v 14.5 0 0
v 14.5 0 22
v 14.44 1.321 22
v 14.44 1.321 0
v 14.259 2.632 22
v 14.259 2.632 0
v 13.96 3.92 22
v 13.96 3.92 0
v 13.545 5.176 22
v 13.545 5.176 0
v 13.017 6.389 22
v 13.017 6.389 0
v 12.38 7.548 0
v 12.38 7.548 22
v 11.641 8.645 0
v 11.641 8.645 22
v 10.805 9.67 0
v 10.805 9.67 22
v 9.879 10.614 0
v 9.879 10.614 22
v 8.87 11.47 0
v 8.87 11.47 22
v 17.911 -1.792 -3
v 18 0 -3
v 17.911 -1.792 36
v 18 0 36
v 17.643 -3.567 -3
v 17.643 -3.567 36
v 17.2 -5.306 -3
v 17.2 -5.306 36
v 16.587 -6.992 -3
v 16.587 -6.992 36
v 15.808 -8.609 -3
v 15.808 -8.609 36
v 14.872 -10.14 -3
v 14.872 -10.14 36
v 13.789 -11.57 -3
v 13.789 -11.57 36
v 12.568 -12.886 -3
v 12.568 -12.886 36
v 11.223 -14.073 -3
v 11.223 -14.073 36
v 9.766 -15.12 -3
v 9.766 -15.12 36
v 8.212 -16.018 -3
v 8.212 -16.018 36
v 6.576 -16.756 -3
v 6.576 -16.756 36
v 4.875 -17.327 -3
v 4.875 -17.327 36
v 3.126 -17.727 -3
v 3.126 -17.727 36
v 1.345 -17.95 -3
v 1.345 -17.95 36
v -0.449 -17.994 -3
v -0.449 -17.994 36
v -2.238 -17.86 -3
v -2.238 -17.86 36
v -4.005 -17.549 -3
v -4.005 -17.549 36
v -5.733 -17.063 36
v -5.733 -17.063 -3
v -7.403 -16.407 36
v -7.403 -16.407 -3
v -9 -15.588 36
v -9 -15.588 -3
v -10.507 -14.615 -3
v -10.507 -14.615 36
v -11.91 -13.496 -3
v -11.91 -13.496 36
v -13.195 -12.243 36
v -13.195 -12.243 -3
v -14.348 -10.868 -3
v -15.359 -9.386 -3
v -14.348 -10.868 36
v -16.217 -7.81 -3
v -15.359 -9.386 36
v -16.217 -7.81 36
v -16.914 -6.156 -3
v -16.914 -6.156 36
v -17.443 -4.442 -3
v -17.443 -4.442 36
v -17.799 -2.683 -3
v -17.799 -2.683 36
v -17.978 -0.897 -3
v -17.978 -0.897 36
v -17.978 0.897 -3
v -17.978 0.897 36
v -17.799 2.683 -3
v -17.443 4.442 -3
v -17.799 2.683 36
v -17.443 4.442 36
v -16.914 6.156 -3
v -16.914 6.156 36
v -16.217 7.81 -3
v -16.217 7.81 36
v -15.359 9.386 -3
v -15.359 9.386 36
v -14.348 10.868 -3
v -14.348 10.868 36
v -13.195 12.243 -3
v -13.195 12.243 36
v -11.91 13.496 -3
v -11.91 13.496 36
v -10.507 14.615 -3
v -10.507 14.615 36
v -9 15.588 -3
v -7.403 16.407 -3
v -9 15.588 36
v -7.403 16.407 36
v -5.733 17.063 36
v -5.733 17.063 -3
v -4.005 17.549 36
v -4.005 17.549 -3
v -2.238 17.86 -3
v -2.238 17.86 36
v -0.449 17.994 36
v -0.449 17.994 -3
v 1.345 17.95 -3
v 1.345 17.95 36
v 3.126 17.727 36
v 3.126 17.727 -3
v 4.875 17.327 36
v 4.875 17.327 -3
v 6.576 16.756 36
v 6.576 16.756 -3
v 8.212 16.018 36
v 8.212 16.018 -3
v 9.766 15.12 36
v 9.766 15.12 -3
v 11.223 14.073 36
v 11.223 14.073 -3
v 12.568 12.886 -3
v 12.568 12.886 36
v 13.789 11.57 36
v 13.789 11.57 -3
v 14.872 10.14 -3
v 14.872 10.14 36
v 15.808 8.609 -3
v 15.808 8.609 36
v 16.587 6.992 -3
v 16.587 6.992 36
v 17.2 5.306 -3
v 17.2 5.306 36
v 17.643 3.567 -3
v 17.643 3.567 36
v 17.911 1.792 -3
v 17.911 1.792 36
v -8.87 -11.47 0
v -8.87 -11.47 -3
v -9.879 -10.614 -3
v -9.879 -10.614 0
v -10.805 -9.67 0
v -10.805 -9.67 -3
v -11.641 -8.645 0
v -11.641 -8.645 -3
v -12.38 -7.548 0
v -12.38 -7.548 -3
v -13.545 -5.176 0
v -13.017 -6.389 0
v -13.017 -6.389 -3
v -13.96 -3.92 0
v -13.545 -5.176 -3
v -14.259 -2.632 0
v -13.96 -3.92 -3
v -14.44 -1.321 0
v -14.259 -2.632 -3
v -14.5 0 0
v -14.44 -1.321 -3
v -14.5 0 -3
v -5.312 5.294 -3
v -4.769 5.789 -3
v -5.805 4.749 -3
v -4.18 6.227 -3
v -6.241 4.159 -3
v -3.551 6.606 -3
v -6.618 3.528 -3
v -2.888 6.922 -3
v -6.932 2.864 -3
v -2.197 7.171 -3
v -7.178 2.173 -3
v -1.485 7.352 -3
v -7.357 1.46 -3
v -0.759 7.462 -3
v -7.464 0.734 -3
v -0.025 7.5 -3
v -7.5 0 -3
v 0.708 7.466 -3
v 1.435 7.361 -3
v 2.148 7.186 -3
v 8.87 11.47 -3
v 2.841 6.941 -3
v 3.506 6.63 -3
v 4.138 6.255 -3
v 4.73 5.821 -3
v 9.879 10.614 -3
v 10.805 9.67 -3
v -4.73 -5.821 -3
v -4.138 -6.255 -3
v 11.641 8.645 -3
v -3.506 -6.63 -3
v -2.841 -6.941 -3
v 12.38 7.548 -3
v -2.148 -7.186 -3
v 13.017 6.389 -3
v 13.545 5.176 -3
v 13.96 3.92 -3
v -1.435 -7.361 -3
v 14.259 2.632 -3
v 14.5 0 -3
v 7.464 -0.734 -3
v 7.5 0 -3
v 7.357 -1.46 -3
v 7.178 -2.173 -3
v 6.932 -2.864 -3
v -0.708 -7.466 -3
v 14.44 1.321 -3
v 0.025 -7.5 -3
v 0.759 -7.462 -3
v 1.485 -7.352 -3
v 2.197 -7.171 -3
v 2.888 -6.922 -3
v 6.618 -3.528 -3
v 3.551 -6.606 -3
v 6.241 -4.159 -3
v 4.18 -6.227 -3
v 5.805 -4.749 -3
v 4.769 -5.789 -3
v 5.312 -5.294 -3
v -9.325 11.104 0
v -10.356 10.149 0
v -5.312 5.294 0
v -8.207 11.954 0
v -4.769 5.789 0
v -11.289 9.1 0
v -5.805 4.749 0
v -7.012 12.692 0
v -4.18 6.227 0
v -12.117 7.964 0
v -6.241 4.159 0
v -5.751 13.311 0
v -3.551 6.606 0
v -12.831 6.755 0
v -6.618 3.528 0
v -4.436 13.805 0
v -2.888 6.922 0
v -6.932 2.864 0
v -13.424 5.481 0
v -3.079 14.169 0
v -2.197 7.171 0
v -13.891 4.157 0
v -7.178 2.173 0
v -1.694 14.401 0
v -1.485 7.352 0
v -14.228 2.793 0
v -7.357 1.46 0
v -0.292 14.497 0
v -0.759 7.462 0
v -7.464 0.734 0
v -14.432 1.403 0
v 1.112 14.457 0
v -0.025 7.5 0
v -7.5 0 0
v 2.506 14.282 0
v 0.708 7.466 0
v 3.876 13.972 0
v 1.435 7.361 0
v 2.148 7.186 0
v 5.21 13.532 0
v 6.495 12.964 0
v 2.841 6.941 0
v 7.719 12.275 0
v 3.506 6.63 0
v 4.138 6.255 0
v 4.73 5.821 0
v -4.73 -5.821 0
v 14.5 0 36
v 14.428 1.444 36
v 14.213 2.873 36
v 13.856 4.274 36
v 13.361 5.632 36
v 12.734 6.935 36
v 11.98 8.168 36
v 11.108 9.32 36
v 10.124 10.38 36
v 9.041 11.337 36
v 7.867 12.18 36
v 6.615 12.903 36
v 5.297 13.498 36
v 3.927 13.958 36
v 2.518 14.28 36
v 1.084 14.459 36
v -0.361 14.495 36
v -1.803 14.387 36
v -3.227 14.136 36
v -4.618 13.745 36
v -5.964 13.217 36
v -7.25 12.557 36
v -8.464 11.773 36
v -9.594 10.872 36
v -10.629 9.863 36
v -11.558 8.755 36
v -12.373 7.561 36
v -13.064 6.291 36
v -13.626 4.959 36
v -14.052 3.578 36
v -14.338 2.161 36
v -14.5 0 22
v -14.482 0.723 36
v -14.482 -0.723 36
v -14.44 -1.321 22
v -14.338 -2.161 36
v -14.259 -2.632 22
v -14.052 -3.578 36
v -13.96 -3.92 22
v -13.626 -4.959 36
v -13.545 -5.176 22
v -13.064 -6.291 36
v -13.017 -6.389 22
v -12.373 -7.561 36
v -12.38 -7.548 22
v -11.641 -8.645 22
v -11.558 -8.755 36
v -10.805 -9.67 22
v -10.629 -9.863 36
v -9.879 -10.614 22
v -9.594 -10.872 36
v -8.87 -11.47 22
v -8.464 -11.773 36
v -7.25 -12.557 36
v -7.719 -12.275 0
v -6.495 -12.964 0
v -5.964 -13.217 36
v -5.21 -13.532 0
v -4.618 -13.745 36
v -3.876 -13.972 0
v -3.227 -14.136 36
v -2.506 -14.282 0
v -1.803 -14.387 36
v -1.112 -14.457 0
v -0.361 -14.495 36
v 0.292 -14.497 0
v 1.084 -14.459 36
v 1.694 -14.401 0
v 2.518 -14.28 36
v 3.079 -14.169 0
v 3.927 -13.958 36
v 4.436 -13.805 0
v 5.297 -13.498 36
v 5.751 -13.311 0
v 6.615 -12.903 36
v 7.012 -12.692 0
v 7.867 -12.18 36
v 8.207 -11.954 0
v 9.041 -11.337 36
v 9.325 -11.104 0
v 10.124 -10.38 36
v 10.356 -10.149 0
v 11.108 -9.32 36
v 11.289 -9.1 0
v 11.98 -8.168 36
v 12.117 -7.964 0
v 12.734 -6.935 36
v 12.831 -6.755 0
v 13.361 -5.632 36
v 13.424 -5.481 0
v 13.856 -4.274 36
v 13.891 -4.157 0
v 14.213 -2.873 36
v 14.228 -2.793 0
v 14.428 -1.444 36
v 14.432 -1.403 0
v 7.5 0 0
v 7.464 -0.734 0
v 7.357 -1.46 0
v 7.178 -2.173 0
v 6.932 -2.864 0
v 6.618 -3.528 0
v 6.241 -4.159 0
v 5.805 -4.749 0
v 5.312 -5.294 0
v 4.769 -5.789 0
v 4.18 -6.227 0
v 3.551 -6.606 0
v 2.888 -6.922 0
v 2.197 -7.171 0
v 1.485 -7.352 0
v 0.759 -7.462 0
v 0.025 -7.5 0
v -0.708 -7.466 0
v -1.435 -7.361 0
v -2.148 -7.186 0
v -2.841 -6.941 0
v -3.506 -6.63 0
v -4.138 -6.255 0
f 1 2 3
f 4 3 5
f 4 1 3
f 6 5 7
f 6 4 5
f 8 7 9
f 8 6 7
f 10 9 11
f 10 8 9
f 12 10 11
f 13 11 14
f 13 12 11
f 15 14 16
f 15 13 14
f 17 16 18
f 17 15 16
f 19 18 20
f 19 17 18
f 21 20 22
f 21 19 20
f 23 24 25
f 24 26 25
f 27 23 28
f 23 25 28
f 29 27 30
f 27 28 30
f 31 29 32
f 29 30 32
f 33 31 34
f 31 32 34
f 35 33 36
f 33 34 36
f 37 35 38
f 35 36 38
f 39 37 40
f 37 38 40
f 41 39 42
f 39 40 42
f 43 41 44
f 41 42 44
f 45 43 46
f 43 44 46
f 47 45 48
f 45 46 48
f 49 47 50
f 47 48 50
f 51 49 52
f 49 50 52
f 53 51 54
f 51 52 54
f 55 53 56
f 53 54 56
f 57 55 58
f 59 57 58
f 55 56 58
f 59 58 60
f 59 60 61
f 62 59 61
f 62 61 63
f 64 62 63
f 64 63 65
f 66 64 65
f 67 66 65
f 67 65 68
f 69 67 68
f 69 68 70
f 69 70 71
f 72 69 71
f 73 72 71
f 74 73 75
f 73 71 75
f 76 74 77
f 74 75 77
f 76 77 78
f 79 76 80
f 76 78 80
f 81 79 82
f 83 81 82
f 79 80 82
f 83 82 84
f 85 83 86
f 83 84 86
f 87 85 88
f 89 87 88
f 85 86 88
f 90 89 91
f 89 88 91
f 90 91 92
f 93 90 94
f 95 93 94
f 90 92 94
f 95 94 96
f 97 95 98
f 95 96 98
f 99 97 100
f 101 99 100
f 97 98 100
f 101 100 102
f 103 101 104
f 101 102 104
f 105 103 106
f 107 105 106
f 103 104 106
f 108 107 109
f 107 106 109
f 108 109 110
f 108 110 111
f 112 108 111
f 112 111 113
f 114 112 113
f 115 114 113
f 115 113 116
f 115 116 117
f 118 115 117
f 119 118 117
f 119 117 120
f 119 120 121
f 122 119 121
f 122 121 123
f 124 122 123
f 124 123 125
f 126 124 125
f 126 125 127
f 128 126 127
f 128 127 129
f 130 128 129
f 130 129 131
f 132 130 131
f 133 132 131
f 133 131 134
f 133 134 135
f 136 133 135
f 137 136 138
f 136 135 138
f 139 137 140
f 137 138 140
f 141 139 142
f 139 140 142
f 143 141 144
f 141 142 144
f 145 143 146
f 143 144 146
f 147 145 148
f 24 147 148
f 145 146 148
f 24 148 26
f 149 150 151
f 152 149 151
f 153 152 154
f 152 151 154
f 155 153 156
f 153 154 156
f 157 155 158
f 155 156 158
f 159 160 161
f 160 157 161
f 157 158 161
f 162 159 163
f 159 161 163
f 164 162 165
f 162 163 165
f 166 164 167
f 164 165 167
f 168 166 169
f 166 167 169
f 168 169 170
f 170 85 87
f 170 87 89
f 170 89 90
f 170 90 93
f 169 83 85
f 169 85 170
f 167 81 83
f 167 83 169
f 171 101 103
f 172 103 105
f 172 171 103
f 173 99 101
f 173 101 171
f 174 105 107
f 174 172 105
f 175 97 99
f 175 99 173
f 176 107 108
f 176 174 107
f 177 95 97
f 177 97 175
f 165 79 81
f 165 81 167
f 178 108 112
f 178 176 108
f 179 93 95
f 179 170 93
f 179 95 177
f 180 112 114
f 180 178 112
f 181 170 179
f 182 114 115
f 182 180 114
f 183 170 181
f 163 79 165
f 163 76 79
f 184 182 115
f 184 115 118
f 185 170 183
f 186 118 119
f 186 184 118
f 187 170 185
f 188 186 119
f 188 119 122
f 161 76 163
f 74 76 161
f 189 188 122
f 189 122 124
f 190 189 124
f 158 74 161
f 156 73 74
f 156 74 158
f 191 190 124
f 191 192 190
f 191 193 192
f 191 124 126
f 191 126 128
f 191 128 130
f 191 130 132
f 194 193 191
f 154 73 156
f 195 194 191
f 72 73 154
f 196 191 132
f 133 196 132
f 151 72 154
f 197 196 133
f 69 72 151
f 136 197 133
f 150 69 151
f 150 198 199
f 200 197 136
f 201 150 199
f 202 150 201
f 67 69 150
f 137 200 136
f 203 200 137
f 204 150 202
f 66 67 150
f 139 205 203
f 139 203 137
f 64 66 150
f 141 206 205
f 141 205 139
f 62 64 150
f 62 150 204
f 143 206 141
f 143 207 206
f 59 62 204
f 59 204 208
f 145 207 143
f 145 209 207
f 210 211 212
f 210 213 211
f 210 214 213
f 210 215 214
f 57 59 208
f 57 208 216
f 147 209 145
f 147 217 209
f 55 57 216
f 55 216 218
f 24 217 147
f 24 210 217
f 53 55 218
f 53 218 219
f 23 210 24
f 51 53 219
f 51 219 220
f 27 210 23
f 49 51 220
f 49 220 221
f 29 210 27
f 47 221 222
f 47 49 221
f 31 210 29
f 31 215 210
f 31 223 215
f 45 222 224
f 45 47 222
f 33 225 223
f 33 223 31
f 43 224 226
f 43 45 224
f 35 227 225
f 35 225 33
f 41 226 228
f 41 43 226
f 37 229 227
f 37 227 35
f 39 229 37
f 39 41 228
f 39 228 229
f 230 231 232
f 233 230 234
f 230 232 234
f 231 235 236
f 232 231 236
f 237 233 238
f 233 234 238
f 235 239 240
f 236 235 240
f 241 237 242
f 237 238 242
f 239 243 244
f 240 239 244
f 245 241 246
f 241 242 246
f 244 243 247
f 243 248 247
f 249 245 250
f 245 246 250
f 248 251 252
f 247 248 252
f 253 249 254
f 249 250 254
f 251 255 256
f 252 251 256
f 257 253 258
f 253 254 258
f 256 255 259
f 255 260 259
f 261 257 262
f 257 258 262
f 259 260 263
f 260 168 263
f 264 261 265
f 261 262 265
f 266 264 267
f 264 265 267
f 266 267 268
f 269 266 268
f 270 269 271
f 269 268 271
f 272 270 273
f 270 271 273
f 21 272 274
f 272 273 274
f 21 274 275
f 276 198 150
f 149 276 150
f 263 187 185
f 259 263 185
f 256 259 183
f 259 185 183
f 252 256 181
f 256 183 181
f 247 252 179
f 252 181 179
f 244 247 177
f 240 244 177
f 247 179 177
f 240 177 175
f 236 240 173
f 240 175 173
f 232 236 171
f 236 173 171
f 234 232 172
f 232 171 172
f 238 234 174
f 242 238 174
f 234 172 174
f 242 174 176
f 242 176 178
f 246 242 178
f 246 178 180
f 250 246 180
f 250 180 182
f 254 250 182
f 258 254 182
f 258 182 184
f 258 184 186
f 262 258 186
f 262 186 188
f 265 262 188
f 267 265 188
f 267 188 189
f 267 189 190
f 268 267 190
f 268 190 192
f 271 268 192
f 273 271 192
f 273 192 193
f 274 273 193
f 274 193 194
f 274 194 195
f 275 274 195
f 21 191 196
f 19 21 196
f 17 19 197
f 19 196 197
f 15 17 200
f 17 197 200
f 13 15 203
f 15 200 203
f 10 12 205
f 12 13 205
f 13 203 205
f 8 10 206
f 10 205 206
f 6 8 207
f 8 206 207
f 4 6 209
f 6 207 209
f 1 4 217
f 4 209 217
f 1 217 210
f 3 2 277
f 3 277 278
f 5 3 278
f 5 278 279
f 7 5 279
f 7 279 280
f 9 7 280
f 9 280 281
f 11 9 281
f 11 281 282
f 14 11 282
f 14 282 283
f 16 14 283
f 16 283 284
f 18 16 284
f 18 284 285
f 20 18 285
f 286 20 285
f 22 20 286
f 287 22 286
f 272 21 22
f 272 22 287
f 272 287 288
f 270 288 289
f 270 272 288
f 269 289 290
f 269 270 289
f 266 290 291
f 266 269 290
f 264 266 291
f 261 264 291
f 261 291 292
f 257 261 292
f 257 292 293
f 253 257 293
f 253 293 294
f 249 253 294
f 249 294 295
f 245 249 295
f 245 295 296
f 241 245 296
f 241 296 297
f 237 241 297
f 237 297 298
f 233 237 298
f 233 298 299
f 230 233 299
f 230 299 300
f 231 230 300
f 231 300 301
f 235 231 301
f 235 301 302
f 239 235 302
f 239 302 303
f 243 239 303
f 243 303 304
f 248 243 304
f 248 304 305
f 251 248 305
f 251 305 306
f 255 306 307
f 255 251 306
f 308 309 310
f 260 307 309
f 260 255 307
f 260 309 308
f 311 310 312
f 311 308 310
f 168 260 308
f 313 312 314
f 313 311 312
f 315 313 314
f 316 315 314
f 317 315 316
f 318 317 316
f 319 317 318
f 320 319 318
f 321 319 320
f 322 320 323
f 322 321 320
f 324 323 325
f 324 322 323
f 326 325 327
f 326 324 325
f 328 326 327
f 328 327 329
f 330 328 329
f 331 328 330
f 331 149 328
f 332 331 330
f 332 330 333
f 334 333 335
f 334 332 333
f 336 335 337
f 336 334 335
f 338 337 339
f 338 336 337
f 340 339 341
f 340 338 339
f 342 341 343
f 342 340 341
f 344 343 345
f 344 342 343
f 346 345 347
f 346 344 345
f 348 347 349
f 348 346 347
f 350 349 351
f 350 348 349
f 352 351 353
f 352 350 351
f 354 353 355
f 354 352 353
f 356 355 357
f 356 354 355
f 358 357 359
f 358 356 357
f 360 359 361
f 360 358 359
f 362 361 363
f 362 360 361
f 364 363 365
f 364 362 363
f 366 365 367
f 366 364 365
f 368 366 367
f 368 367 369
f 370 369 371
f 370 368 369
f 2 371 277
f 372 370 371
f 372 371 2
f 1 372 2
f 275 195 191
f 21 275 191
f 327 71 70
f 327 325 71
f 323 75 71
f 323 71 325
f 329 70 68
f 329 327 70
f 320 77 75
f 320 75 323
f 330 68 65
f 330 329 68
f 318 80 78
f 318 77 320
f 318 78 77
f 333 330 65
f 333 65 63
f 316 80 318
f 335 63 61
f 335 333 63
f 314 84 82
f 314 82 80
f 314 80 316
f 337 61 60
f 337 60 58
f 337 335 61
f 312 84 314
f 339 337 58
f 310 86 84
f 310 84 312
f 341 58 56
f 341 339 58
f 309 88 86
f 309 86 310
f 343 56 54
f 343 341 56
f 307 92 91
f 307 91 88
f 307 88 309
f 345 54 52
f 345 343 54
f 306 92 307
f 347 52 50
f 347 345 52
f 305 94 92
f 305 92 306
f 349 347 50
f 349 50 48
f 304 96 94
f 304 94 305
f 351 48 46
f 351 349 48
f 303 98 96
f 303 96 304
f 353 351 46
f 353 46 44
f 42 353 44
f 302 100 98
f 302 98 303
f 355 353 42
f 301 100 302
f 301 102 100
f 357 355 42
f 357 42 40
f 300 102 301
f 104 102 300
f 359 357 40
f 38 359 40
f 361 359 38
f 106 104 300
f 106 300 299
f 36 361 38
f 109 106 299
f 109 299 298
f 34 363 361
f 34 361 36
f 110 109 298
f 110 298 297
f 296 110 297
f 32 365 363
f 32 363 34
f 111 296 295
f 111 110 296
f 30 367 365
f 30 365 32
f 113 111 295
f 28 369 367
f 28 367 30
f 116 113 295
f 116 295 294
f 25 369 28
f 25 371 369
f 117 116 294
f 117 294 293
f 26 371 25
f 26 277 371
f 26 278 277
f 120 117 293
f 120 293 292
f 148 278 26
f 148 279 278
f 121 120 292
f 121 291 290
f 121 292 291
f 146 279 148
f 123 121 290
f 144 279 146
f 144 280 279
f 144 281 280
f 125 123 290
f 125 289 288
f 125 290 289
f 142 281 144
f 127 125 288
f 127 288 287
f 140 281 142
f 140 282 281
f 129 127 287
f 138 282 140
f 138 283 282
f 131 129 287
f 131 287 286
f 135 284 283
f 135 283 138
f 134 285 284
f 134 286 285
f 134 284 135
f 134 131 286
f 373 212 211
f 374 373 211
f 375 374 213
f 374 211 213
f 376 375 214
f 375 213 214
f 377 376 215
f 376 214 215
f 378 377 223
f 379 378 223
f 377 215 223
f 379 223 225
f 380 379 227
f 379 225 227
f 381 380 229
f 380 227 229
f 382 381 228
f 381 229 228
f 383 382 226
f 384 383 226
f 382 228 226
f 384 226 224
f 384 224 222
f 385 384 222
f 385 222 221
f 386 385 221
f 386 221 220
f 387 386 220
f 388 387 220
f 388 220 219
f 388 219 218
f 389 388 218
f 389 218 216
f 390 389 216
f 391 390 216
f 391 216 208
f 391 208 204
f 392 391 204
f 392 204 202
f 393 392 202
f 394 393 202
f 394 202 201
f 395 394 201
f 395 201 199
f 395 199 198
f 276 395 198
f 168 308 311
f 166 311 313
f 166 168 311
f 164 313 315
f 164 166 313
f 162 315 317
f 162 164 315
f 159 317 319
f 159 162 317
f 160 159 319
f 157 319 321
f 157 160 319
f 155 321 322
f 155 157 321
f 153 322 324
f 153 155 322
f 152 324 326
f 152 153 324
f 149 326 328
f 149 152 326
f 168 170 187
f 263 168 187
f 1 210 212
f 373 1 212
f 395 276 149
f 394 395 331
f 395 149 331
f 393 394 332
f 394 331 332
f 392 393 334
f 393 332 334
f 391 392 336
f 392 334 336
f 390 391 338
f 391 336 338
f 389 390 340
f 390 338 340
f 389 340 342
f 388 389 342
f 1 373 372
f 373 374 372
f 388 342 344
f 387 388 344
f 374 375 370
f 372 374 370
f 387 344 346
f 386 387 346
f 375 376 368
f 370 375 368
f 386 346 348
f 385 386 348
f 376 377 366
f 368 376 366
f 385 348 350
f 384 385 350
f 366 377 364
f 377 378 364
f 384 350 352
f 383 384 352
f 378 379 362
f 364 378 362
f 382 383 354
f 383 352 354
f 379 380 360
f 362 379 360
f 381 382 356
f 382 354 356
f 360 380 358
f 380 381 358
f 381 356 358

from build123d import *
from build123d import SkipClean  # not in build123d's __all__

# Parameters (mm, degrees)
F0_R     = 18
F0_R_2   = 14.5
F1_DEPTH = 36
F2_R     = 18
F3_DEPTH = 3
F5_DEPTH = 25


with BuildPart() as f1:
    # F0 (on Top) → F1 (new body)
    with BuildSketch(Plane.XY):
        Circle(F0_R)
        Circle(F0_R_2, mode=Mode.SUBTRACT)
    extrude(amount=F1_DEPTH)

    # F2 (on face) → F3 (join)
    with BuildSketch(Plane(origin=(0, 0, 0), x_dir=(1, 0, 0), z_dir=(0, 0, -1))):
        Circle(F2_R)
    extrude(amount=F3_DEPTH)

    # F4 (on face) → F5 (cut)
    with BuildSketch(Plane(origin=(0, 0, -3), x_dir=(1, 0, 0), z_dir=(0, 0, -1))):
        with BuildLine():
            Line((-4.7296723619, 5.8206700086), (-8.8702309022, 11.4703532527))
            ThreePointArc((-8.8702309022, 11.4703532527), (-13.0166882901, 6.388726474), (-14.5, 0))
            Line((-14.5, 0), (-7.5, 0))
            ThreePointArc((-7.5, 0), (-6.7720950493, 3.2231550758), (-4.7296723619, 5.8206700086))
        make_face()
        with BuildLine():
            ThreePointArc((7.5, 0), (3.2231550758, 6.7720950493), (-4.7296723619, 5.8206700086))
            ThreePointArc((-4.7296723619, 5.8206700086), (-6.7720950493, 3.2231550758), (-7.5, 0))
            ThreePointArc((-7.5, 0), (-3.2231550758, -6.7720950493), (4.7296723619, -5.8206700086))
            ThreePointArc((4.7296723619, -5.8206700086), (6.7720950493, -3.2231550758), (7.5, 0))
        make_face()
        with BuildLine():
            Line((14.5, 0), (7.5, 0))
            ThreePointArc((7.5, 0), (6.7720950493, -3.2231550758), (4.7296723619, -5.8206700086))
            Line((4.7296723619, -5.8206700086), (8.8702309022, -11.4703532527))
            ThreePointArc((8.8702309022, -11.4703532527), (13.0166882901, -6.388726474), (14.5, 0))
        make_face()
    with SkipClean():  # cleaning this boolean's faces spoils the solid; the shape is the same uncleaned
        extrude(amount=-F5_DEPTH, mode=Mode.SUBTRACT)


solid = f1.part
